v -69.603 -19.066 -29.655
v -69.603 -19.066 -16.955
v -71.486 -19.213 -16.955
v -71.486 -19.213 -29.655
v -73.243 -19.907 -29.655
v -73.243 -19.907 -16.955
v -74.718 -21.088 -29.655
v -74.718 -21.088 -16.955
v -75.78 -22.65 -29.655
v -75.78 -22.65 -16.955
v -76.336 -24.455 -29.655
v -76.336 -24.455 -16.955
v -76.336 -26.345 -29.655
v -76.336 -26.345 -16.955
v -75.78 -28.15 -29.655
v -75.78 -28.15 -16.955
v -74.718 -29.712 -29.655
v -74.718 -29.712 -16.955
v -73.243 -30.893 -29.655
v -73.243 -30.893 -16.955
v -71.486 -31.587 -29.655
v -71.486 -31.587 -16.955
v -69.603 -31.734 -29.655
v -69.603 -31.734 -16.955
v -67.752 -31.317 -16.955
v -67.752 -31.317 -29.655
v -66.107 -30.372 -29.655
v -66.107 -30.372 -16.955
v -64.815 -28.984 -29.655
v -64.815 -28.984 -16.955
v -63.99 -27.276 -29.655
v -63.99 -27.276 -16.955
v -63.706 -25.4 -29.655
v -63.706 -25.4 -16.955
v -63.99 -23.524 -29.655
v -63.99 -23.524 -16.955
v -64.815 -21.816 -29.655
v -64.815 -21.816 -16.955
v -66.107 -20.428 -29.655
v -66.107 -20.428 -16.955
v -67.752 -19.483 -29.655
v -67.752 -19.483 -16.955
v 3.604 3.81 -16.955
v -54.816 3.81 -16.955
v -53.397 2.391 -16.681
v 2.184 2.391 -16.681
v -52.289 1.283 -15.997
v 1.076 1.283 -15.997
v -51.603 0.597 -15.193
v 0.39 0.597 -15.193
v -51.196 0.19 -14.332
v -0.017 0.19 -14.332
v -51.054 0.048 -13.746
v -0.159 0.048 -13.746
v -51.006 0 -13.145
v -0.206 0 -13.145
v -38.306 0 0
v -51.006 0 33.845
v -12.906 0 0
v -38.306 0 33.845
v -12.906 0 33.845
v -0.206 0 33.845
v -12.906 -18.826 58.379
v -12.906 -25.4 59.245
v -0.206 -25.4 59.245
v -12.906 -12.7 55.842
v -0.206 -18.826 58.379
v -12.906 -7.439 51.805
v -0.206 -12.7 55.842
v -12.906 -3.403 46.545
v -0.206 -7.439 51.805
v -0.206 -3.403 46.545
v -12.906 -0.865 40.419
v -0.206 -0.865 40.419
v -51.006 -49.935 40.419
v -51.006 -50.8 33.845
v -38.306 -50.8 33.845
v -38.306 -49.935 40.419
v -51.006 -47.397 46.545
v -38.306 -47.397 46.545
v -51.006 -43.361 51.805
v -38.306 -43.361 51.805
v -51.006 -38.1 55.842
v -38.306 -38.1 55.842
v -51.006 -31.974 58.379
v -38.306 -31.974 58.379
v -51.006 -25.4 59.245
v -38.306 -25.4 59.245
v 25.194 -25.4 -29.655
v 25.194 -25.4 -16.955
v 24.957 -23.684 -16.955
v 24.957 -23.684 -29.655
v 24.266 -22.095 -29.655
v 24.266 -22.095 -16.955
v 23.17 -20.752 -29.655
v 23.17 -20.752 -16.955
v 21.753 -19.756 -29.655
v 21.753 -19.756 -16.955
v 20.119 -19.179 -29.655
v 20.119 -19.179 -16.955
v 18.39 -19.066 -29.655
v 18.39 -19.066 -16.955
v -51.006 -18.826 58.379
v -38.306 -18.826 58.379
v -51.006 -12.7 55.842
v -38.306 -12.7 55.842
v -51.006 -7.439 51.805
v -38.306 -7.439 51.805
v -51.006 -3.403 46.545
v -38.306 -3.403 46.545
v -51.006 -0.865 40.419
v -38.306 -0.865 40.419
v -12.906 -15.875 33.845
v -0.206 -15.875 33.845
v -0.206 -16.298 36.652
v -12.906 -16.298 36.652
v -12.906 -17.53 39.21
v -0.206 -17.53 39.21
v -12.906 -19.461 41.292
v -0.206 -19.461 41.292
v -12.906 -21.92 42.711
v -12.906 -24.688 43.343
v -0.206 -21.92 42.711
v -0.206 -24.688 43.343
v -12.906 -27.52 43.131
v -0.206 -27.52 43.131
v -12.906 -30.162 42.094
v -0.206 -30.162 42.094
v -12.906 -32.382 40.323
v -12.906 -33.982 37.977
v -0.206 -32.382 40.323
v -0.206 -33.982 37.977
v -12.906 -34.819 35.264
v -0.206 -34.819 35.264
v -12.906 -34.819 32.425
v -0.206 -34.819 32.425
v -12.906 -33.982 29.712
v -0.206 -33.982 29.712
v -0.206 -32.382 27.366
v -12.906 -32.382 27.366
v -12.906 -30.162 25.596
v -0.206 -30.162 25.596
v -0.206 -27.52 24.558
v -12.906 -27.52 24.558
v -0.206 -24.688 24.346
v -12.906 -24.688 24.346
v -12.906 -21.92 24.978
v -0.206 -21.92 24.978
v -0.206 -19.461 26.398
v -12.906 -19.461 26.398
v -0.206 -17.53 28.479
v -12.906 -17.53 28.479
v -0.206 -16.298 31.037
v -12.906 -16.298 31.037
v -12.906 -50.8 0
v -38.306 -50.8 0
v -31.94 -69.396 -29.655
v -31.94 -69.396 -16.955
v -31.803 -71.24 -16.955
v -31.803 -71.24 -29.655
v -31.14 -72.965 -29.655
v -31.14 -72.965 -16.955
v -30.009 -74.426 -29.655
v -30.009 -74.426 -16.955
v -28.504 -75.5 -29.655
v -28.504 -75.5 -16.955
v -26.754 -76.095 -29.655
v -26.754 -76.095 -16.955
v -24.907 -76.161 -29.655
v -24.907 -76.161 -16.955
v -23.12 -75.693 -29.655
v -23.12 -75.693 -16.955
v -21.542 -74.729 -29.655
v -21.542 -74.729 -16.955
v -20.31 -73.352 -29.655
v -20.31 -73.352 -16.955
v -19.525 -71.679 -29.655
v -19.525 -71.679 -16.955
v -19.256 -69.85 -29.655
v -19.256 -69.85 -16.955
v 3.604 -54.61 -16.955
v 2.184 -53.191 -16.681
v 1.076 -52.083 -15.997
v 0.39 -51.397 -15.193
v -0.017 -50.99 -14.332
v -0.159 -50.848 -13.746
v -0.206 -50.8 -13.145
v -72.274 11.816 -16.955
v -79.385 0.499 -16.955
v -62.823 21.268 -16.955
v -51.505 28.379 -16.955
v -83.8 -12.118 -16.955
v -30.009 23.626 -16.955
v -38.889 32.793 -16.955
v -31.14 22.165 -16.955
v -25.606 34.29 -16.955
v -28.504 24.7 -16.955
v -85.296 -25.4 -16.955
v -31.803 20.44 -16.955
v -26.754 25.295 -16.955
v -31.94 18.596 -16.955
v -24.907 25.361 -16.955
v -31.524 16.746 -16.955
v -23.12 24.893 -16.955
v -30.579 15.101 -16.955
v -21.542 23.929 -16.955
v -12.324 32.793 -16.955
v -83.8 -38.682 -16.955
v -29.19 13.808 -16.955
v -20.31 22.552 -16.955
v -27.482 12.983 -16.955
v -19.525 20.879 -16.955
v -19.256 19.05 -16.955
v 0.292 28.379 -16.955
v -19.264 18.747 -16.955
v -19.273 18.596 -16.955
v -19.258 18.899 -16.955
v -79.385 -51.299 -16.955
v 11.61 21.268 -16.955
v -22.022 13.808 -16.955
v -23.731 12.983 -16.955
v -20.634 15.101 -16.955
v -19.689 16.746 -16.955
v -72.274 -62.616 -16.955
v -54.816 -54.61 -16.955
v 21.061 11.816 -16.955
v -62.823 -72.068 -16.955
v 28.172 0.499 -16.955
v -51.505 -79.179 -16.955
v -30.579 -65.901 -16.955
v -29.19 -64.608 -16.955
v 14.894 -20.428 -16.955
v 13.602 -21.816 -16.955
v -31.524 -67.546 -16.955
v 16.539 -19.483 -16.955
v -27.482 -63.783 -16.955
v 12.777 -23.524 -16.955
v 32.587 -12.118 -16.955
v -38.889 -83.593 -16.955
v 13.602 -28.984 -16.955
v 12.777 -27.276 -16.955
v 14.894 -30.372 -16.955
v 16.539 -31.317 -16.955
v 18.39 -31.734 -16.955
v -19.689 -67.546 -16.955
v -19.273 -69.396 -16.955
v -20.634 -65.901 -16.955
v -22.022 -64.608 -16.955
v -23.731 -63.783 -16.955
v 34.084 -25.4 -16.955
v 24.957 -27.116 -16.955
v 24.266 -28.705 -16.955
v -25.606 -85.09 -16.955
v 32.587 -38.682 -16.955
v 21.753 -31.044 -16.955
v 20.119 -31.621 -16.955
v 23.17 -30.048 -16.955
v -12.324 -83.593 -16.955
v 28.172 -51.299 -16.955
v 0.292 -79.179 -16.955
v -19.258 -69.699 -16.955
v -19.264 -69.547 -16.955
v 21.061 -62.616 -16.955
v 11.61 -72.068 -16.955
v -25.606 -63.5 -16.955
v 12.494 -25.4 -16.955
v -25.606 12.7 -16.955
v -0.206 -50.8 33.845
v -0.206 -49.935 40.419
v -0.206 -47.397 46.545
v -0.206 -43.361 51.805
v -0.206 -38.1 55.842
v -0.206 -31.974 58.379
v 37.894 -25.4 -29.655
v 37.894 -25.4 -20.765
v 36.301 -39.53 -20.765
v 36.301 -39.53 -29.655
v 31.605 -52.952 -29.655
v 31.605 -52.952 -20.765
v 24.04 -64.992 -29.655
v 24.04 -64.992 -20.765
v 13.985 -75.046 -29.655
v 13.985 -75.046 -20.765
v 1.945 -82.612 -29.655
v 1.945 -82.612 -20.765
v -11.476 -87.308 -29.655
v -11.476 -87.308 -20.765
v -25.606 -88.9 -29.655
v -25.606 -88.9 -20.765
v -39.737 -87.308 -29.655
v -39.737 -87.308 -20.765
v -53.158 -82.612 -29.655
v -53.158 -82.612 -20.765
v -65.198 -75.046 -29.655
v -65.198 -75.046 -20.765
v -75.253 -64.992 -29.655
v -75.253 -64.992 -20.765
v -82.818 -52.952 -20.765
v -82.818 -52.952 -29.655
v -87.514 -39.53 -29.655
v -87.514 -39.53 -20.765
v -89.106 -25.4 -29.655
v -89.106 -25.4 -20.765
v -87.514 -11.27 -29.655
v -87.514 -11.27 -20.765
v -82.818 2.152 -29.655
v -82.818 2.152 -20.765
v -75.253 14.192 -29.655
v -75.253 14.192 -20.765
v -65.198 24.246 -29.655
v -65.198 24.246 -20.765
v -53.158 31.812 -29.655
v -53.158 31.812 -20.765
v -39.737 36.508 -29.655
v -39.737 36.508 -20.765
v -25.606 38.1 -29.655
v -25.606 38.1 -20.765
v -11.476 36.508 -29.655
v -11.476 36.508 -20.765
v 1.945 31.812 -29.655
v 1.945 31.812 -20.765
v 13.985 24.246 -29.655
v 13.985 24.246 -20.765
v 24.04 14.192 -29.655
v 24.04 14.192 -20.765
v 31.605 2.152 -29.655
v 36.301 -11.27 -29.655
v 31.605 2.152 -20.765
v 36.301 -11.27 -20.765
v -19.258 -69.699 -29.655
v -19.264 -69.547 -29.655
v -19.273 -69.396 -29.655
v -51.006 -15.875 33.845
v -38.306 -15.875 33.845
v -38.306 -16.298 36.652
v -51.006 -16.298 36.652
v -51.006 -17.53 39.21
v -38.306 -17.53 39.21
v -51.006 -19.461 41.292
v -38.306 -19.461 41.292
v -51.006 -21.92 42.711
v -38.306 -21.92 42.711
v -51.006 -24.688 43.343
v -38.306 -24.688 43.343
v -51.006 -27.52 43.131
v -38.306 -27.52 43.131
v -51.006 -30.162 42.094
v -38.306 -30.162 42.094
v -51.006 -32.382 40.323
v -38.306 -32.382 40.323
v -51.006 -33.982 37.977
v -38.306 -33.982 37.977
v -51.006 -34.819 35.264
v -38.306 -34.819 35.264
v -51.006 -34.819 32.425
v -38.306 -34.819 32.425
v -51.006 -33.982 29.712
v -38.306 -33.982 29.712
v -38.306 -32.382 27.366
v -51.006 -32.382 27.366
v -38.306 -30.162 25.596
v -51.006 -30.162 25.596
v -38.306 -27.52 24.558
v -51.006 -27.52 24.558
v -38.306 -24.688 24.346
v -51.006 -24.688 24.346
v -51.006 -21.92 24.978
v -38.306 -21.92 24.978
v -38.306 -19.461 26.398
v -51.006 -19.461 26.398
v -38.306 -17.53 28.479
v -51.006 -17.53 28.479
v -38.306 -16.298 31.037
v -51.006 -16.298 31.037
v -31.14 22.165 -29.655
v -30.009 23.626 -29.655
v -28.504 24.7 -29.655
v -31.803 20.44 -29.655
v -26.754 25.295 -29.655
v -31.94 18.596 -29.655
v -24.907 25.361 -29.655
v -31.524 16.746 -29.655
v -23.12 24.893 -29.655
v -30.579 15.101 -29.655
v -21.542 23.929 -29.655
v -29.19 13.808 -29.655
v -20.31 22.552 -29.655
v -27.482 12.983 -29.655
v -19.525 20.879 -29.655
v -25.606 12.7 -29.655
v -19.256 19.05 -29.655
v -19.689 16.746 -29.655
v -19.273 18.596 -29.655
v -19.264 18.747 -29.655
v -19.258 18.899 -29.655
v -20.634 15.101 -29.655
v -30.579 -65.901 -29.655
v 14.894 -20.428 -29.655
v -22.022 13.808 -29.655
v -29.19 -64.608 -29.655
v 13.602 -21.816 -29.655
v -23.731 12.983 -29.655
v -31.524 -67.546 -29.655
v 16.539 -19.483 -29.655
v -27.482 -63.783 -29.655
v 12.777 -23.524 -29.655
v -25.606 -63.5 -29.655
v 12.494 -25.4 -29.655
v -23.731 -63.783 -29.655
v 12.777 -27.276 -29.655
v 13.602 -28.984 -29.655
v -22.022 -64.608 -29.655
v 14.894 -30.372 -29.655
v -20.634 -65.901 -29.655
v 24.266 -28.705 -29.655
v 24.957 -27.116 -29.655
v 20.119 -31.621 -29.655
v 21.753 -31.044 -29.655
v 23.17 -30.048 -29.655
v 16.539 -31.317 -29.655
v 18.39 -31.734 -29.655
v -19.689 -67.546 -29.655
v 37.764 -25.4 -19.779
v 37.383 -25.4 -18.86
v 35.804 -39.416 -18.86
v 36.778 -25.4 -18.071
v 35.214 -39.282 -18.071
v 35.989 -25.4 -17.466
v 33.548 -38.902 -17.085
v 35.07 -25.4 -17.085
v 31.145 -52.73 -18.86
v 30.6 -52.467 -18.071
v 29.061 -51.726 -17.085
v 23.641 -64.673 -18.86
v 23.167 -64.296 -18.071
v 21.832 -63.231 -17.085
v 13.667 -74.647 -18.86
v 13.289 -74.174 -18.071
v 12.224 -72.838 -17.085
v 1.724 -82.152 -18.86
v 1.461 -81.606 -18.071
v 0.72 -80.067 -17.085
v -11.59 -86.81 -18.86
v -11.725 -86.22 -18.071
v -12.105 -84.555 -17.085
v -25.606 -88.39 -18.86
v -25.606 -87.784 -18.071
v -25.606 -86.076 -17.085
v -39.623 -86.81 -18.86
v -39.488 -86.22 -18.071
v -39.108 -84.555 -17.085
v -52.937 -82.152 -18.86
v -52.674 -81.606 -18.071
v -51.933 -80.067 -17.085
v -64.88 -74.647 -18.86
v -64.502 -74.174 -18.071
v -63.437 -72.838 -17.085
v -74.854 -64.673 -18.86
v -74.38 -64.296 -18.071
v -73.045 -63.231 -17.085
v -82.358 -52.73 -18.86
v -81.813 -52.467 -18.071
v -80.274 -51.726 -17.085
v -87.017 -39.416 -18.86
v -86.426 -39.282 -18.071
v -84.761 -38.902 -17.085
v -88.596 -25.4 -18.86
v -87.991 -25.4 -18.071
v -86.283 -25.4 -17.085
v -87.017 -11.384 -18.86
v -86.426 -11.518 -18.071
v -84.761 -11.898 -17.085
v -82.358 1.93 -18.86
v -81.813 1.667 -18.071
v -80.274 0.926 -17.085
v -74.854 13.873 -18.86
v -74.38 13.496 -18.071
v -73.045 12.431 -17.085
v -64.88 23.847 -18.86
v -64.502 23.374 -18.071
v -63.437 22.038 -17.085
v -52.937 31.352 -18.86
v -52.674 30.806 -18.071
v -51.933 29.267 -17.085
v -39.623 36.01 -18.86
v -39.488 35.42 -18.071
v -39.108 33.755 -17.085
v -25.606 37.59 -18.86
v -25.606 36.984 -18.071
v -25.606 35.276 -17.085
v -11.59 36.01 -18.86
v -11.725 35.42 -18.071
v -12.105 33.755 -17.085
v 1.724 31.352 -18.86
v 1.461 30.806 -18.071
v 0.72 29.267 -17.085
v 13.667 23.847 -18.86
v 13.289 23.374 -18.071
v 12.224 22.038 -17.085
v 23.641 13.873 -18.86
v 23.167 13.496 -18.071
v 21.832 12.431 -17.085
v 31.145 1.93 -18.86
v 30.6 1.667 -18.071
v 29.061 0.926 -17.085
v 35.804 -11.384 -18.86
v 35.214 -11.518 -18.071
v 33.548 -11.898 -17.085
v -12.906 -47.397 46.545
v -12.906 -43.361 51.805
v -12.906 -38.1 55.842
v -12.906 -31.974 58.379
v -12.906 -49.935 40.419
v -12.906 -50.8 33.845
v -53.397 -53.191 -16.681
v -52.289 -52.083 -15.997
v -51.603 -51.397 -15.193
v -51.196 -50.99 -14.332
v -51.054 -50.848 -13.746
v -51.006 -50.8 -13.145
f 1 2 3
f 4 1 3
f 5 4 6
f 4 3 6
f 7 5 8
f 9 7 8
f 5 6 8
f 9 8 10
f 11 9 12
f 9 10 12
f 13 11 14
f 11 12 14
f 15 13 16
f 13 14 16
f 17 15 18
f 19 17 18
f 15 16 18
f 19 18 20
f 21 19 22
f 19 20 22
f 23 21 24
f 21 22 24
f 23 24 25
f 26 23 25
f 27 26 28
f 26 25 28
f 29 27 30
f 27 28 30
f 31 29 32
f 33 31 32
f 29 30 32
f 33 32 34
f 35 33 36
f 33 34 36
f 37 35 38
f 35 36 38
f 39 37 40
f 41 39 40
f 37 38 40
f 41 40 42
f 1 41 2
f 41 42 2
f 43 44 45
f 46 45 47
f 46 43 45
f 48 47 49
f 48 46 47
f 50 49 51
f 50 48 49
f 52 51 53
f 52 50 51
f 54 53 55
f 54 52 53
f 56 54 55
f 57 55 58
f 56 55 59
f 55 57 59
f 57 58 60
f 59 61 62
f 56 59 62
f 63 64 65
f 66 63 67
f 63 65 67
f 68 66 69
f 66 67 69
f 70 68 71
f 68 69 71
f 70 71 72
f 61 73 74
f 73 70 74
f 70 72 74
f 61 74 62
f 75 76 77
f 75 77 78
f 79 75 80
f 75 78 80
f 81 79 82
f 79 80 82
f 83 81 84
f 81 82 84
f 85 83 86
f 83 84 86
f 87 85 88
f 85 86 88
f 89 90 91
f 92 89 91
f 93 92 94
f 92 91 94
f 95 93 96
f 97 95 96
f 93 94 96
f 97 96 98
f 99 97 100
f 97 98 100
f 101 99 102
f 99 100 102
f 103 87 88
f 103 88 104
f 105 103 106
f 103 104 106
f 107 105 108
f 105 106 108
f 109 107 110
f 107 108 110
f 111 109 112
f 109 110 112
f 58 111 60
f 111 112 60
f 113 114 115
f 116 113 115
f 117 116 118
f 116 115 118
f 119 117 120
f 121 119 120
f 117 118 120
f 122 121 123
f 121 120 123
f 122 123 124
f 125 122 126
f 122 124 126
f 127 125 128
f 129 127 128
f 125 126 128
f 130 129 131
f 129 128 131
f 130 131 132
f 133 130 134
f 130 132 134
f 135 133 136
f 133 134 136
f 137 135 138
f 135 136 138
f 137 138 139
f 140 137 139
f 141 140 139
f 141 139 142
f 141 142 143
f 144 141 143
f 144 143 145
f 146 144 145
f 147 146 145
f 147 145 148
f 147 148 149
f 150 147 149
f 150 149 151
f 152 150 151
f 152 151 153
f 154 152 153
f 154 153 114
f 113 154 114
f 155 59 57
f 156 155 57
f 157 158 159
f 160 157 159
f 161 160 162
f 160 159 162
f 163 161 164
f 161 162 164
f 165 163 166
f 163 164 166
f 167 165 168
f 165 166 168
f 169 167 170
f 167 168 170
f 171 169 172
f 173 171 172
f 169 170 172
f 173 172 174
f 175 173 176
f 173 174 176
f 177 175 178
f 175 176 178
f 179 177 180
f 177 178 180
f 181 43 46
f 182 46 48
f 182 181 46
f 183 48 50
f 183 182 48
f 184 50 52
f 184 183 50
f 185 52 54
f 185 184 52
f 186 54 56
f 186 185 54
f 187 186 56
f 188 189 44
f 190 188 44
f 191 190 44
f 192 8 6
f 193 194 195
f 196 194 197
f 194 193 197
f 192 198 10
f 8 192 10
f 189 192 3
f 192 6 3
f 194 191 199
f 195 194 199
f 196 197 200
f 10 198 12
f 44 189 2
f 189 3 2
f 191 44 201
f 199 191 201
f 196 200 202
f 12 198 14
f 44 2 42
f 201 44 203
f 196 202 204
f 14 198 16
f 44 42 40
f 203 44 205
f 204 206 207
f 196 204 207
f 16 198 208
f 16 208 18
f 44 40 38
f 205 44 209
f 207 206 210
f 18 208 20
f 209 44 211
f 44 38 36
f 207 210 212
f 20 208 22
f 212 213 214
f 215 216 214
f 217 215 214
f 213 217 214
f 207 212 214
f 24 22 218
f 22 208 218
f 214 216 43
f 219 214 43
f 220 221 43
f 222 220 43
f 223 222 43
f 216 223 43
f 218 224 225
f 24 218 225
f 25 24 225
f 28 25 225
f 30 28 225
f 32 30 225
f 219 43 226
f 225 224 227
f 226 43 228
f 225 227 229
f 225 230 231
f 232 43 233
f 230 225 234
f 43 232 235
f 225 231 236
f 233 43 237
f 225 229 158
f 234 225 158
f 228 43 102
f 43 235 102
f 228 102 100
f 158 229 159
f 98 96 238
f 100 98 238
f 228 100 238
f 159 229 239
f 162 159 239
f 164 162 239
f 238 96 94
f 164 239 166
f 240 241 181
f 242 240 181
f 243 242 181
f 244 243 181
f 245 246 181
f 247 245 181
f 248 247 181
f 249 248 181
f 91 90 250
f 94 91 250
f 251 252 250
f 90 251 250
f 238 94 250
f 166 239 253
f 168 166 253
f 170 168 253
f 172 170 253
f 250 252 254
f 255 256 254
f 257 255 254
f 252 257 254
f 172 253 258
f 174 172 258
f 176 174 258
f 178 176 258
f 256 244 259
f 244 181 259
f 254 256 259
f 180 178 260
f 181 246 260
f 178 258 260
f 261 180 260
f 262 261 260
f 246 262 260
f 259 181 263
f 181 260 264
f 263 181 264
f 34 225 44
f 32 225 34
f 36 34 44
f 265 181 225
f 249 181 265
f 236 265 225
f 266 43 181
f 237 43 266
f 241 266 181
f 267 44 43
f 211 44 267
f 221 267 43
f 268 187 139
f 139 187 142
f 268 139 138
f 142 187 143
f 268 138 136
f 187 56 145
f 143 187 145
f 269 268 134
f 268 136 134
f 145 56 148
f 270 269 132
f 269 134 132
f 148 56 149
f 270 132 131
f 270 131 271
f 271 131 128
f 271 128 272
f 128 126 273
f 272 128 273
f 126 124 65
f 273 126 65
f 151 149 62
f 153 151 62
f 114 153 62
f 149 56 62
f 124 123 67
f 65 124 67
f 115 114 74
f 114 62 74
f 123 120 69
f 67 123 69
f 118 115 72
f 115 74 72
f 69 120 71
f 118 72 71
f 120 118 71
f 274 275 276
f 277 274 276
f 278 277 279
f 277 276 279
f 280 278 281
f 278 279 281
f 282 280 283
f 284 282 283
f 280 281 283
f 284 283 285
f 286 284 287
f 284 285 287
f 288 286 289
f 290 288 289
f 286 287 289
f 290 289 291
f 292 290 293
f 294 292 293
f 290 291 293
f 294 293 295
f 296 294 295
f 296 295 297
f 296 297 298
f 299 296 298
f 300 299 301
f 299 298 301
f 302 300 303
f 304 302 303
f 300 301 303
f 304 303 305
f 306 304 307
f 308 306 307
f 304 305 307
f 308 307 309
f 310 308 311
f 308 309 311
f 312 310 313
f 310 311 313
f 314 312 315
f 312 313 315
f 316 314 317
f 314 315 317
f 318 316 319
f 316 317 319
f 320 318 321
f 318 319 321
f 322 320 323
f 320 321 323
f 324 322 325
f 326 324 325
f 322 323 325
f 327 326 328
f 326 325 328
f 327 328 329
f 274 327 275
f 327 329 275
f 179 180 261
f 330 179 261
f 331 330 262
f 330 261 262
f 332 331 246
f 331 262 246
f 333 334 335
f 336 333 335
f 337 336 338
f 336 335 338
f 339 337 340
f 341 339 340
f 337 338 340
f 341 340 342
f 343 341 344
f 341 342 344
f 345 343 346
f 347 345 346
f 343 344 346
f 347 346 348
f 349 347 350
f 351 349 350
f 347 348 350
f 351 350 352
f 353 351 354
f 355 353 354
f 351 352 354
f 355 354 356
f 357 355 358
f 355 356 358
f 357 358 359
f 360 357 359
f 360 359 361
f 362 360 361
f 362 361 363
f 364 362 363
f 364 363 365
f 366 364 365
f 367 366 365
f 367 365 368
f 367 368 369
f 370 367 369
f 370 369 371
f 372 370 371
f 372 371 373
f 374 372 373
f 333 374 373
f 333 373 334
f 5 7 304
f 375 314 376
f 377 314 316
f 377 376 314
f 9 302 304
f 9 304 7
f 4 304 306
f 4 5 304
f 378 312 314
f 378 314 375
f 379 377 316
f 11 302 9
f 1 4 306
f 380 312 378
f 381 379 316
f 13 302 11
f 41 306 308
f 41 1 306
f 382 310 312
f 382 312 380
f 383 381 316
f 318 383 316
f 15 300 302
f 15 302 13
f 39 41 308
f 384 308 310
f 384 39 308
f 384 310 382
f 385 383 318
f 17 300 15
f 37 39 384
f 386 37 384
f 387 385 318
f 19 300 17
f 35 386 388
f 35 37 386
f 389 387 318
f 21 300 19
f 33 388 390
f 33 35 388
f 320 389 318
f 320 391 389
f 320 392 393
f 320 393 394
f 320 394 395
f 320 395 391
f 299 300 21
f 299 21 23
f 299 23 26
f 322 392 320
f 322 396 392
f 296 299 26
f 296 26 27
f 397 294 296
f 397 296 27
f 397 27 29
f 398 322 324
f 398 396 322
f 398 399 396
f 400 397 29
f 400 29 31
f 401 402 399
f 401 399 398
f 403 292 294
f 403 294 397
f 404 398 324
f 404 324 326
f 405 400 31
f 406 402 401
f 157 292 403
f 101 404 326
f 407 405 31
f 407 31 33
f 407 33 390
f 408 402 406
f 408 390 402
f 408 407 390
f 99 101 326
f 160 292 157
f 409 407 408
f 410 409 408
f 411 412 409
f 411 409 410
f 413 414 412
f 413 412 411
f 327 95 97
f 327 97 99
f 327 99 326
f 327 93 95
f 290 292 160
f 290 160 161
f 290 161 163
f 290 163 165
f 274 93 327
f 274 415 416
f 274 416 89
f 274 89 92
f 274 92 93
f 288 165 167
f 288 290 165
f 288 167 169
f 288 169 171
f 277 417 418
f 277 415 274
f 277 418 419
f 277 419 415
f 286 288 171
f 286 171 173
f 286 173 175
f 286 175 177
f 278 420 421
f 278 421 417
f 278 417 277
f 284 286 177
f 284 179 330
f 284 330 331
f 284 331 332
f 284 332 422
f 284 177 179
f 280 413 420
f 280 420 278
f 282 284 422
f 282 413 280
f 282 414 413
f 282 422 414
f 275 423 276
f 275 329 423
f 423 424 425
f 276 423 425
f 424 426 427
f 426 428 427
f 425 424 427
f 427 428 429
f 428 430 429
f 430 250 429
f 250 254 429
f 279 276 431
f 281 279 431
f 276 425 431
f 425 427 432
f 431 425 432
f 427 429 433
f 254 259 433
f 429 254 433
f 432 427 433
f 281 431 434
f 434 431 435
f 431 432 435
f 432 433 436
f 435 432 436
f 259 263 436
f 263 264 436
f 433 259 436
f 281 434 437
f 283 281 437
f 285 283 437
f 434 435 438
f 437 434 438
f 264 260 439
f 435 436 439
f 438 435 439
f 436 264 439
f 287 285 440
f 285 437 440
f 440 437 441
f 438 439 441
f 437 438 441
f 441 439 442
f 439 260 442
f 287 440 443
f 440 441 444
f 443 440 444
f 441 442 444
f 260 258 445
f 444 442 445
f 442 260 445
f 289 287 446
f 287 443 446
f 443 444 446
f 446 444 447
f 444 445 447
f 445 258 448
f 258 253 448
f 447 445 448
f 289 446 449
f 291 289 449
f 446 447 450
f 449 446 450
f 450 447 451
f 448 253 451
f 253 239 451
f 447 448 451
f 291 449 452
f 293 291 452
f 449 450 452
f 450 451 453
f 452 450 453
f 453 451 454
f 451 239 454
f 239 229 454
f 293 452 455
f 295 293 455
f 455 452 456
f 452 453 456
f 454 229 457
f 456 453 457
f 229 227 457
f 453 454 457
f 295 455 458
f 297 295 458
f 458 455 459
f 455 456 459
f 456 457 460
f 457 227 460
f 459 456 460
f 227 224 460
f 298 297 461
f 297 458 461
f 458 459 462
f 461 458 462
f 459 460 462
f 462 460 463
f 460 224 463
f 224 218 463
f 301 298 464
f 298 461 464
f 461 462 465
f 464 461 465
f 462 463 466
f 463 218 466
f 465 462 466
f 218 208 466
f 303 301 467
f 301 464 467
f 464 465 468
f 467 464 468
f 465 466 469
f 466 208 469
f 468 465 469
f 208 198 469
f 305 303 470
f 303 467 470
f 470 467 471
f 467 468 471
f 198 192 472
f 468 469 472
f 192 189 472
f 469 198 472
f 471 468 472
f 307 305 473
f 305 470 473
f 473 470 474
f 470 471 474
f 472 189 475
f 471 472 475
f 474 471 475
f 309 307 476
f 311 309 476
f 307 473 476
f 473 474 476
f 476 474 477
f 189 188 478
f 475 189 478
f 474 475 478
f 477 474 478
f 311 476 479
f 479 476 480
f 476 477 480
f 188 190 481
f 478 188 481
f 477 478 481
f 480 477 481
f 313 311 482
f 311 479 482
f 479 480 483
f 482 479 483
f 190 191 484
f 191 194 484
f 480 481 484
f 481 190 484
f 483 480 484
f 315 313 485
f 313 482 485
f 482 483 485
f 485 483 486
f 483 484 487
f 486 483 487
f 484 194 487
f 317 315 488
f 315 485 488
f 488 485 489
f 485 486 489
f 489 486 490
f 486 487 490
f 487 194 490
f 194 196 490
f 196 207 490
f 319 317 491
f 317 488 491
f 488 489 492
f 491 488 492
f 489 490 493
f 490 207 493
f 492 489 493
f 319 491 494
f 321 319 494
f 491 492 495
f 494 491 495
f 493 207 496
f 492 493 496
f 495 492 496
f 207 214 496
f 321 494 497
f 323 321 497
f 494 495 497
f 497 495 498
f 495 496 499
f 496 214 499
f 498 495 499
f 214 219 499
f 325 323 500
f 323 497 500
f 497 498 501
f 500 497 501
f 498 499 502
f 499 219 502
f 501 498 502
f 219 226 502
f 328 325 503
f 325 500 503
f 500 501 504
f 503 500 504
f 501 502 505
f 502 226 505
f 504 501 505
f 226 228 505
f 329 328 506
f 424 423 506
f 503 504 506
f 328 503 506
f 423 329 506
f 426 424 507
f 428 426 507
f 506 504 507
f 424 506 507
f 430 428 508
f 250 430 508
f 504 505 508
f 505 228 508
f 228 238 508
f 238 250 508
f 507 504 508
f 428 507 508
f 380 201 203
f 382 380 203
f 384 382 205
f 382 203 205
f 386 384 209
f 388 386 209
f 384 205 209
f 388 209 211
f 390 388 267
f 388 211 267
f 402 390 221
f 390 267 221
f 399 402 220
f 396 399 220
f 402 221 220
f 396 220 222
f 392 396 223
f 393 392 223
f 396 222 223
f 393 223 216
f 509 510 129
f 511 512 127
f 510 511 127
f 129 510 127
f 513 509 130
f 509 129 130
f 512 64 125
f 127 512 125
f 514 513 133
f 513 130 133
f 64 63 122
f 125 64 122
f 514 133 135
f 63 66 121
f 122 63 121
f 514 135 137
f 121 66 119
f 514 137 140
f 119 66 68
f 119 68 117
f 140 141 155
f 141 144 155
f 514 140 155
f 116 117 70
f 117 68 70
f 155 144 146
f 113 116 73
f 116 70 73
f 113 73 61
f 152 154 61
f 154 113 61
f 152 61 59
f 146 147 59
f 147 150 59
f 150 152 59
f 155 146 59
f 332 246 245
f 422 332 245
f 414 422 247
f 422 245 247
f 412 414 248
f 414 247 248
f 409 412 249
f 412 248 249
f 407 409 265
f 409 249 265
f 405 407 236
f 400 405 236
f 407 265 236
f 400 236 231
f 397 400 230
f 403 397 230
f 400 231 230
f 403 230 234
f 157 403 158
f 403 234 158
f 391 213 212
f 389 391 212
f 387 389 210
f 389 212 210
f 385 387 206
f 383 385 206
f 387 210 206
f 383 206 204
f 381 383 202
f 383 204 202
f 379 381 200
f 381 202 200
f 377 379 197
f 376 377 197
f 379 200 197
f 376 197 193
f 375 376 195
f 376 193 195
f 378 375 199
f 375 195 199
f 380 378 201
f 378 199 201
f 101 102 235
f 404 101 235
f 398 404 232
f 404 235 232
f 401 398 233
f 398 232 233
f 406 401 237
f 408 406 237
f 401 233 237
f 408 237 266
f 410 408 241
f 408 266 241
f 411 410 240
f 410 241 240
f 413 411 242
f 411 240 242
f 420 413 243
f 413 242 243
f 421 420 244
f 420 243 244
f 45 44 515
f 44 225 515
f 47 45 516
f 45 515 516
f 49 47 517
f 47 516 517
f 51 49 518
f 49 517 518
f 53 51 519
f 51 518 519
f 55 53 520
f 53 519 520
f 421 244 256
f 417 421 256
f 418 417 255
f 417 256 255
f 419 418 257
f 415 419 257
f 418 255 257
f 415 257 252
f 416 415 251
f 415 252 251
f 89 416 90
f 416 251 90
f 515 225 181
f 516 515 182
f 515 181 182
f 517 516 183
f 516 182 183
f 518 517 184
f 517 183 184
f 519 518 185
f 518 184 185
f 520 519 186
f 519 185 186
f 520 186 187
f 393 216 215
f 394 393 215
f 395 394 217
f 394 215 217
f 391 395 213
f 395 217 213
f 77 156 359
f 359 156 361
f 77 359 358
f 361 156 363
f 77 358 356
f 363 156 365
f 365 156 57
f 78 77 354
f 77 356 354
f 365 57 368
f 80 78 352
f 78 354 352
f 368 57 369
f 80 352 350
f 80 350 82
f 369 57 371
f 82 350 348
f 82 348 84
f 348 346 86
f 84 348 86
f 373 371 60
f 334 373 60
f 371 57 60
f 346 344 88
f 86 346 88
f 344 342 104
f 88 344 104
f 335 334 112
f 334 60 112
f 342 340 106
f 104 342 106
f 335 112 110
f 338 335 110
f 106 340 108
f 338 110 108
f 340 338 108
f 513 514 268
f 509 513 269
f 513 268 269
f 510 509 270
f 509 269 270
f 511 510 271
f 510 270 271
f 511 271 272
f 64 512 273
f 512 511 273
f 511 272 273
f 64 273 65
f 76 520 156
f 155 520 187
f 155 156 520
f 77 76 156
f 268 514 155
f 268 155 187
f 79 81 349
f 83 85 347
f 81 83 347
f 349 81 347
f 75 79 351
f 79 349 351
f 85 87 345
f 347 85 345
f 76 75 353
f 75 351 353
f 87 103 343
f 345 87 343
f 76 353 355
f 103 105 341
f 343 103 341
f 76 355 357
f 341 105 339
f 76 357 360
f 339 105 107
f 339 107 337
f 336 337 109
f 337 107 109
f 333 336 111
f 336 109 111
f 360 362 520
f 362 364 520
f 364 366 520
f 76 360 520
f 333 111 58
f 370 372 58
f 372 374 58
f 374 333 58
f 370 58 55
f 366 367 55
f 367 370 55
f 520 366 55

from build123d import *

# Parameters (mm, degrees)
F1_DEPTH = 50.8
F3_DEPTH = 50.801
F4_R     = 9.525
F5_DEPTH = 50.801
F6_R     = 63.5
F6_W     = 50.8
F6_H     = 50.8
F7_DEPTH = 12.7
F8_R     = 3.81


with BuildPart() as f1:
    # F0 (on Front) → F1 (new body)
    with BuildSketch(Plane.XZ):
        Polygon((-38.3064501607, 0), (-38.3064501607, 59.24468064), (-51.0064501607, 59.24468064), (-51.0064501607, -16.95531936), (-0.2064501607, -16.95531936), (-0.2064501607, 59.24468064), (-12.9064501607, 59.24468064), (-12.9064501607, 0), align=None)
    extrude(amount=F1_DEPTH)

    # F2 (on face) → F3 (cut, through all)
    with BuildSketch(Plane.YZ.offset(-0.2064501607)):
        with BuildLine():
            ThreePointArc((-50.8, 33.84468064), (-43.3605122421, 51.8051928821), (-25.4, 59.24468064))
            Line((-25.4, 59.24468064), (-50.8, 59.24468064))
            Line((-50.8, 59.24468064), (-50.8, 33.84468064))
        make_face()
        with BuildLine():
            ThreePointArc((-25.4, 59.24468064), (-7.4394877579, 51.8051928821), (0, 33.84468064))
            Line((0, 33.84468064), (0, 59.24468064))
            Line((0, 59.24468064), (-25.4, 59.24468064))
        make_face()
    extrude(amount=-F3_DEPTH, mode=Mode.SUBTRACT)

    # F4 (on face) → F5 (cut, through all)
    with BuildSketch(Plane.YZ.offset(-0.2064501607)):
        with Locations((-25.4, 33.84468064)):
            Circle(F4_R)
    extrude(amount=-F5_DEPTH, mode=Mode.SUBTRACT)

    # F6 (on face) → F7 (join)
    with BuildSketch(Plane(origin=(0, 0, -16.95531936), x_dir=(1, 0, 0), z_dir=(0, 0, -1))):
        with Locations((-25.6064501607, 25.4)):
            Circle(F6_R)
        with BuildLine():
            ThreePointArc((-19.2726698552, 69.3964285714), (5.824446263, 56.8308964237), (18.3899784107, 31.7337803056))
            ThreePointArc((18.3899784107, 31.7337803056), (23.1703455028, 30.0477240974), (25.1935498393, 25.4))
            ThreePointArc((25.1935498393, 25.4), (23.1703455028, 20.7522759026), (18.3899784107, 19.0662196944))
            ThreePointArc((18.3899784107, 19.0662196944), (5.824446263, -6.0308964237), (-19.2726698552, -18.5964285714))
            ThreePointArc((-19.2726698552, -18.5964285714), (-19.2605063799, -18.8230693282), (-19.2564501607, -19.05))
            ThreePointArc((-19.2564501607, -19.05), (-25.8333808326, -25.3959437809), (-31.9402304663, -18.5964285714))
            ThreePointArc((-31.9402304663, -18.5964285714), (-57.0373465845, -6.0308964237), (-69.6028787322, 19.0662196944))
            ThreePointArc((-69.6028787322, 19.0662196944), (-76.4064501607, 25.4), (-69.6028787322, 31.7337803056))
            ThreePointArc((-69.6028787322, 31.7337803056), (-57.0373465845, 56.8308964237), (-31.9402304663, 69.3964285714))
            ThreePointArc((-31.9402304663, 69.3964285714), (-25.8333808326, 76.1959437809), (-19.2564501607, 69.85))
            ThreePointArc((-19.2564501607, 69.85), (-19.2605063799, 69.6230693282), (-19.2726698552, 69.3964285714))
        make_face(mode=Mode.SUBTRACT)
        with BuildLine():
            ThreePointArc((18.3899784107, 19.0662196944), (12.4935498393, 25.4), (18.3899784107, 31.7337803056))
            ThreePointArc((18.3899784107, 31.7337803056), (5.824446263, 56.8308964237), (-19.2726698552, 69.3964285714))
            ThreePointArc((-19.2726698552, 69.3964285714), (-25.6064501607, 63.5), (-31.9402304663, 69.3964285714))
            ThreePointArc((-31.9402304663, 69.3964285714), (-57.0373465845, 56.8308964237), (-69.6028787322, 31.7337803056))
            ThreePointArc((-69.6028787322, 31.7337803056), (-65.4087260633, 29.7267956636), (-63.7064501607, 25.4))
            ThreePointArc((-63.7064501607, 25.4), (-65.4087260633, 21.0732043364), (-69.6028787322, 19.0662196944))
            ThreePointArc((-69.6028787322, 19.0662196944), (-57.0373465845, -6.0308964237), (-31.9402304663, -18.5964285714))
            ThreePointArc((-31.9402304663, -18.5964285714), (-25.6064501607, -12.7), (-19.2726698552, -18.5964285714))
            ThreePointArc((-19.2726698552, -18.5964285714), (5.824446263, -6.0308964237), (18.3899784107, 19.0662196944))
        make_face()
        with Locations((-25.6064501607, 25.4)):
            Rectangle(F6_W, F6_H, mode=Mode.SUBTRACT)
        with Locations((-25.6064501607, 25.4)):
            Rectangle(F6_W, F6_H)
    extrude(amount=F7_DEPTH)

    # F8
    f8_edges = [f1.edges().sort_by_distance(p)[0] for p in [
        (-51.00645, -25.4, -16.955319),
        (-25.60645, -50.8, -16.955319),
        (-0.20645, -25.4, -16.955319),
        (-25.60645, 0, -16.955319),
        (-89.10645, -25.4, -16.955319),
    ]]
    fillet(f8_edges, radius=F8_R)


solid = f1.part
